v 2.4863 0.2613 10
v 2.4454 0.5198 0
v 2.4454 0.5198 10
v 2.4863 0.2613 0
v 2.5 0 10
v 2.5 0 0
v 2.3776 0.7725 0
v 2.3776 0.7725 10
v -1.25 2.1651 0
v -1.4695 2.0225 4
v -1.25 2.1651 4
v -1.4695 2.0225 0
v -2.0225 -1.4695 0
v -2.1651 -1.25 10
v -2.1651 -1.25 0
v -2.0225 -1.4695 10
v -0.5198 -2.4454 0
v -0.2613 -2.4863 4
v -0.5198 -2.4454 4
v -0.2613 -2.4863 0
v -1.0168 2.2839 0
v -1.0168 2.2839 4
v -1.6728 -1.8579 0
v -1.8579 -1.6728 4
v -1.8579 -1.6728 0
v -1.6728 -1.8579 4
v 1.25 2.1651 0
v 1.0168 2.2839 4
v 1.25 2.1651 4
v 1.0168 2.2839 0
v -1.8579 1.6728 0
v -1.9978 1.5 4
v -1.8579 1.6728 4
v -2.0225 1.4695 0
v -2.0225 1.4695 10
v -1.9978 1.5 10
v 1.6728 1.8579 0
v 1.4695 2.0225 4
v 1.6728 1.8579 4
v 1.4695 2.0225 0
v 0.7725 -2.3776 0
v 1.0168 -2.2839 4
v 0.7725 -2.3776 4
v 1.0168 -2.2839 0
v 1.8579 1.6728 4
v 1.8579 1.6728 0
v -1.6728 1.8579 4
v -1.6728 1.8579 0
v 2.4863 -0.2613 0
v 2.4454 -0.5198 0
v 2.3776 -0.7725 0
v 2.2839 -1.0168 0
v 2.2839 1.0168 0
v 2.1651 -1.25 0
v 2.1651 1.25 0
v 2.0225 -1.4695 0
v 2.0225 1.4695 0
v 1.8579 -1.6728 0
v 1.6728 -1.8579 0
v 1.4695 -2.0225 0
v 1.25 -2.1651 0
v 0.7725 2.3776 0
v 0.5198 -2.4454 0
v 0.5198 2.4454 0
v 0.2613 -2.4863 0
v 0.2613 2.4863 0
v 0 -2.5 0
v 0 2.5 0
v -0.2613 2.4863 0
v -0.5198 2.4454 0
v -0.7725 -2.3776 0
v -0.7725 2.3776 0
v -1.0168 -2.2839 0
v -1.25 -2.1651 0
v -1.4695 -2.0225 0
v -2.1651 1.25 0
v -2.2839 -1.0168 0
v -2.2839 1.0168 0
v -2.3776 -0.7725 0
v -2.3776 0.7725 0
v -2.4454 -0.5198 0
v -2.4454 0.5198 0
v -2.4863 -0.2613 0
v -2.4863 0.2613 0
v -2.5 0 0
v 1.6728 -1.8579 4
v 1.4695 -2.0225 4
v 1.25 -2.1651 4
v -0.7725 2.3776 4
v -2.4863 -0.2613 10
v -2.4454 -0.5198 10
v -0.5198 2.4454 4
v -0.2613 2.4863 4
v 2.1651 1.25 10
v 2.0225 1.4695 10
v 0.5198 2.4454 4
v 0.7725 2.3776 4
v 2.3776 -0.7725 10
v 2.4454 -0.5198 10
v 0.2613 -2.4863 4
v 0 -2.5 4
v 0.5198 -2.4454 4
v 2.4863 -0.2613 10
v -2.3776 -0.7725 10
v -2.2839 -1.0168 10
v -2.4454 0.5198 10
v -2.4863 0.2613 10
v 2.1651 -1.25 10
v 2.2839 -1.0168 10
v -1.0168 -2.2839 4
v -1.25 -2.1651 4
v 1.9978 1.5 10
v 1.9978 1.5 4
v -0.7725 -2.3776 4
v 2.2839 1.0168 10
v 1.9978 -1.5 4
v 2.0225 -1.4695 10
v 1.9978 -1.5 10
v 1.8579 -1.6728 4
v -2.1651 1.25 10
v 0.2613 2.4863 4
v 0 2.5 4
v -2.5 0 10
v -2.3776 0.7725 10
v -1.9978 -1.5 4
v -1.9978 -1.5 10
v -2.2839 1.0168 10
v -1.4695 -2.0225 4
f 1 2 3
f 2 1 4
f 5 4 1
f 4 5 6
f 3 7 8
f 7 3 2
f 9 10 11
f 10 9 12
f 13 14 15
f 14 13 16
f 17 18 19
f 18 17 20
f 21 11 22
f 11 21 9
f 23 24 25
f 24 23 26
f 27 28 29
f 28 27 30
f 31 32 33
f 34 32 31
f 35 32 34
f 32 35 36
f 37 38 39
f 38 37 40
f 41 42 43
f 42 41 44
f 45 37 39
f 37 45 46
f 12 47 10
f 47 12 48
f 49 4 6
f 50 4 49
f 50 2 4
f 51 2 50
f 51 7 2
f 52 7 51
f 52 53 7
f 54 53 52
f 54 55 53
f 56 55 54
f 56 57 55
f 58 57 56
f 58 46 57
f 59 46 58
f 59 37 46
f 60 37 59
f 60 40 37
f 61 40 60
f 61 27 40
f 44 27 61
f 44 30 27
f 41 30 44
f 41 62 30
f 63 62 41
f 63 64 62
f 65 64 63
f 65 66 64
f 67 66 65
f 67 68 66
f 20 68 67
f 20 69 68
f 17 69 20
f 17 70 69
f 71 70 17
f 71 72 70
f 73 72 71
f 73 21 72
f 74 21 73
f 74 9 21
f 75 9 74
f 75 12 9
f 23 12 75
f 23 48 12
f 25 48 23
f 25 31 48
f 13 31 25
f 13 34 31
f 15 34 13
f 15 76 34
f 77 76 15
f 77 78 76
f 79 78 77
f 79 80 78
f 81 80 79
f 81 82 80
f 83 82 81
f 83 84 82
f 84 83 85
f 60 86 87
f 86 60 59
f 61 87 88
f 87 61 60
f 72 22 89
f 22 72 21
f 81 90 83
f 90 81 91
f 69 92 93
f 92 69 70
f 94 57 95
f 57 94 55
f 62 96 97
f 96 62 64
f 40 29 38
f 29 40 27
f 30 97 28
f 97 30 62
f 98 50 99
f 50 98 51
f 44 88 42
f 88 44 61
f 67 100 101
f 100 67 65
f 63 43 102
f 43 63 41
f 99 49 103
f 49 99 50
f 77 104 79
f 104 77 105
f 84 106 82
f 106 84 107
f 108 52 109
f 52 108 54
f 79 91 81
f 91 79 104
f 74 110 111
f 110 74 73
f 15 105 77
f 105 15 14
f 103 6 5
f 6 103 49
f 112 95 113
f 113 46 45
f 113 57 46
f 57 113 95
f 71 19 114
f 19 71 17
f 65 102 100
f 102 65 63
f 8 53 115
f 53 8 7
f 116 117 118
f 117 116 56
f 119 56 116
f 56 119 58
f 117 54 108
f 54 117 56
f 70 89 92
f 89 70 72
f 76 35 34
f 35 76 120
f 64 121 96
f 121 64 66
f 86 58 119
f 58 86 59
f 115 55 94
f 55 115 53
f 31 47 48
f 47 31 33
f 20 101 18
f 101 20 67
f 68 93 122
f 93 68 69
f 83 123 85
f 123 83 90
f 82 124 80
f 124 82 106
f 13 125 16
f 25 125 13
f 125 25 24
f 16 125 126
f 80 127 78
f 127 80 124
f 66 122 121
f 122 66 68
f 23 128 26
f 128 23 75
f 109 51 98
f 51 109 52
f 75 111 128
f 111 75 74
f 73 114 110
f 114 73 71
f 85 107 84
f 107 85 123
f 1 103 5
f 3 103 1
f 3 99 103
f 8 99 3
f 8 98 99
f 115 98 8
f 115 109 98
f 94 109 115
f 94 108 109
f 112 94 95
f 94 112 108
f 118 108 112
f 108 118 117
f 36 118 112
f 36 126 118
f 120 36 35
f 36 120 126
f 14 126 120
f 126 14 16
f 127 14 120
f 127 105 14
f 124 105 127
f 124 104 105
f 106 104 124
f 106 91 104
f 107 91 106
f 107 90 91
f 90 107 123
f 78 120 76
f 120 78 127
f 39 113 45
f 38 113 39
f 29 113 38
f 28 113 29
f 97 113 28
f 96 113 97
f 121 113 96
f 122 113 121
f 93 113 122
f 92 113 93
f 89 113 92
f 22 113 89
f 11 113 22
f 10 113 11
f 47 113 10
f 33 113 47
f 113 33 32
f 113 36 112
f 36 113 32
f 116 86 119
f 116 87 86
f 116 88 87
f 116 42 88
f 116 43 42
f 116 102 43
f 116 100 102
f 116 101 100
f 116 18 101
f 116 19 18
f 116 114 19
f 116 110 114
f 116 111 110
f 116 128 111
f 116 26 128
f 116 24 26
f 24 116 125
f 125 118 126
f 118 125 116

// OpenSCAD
/*
   Copyright 2015-2018 Scott Bezek and the splitflap contributors

   Licensed under the Apache License, Version 2.0 (the "License");
   you may not use this file except in compliance with the License.
   You may obtain a copy of the License at

       http://www.apache.org/licenses/LICENSE-2.0

   Unless required by applicable law or agreed to in writing, software
   distributed under the License is distributed on an "AS IS" BASIS,
   WITHOUT WARRANTIES OR CONDITIONS OF ANY KIND, either express or implied.
   See the License for the specific language governing permissions and
   limitations under the License.
*/

28byj48_chassis_radius = 28/2;
28byj48_chassis_height = 19;
28byj48_shaft_offset = 8;
28byj48_mount_outer_radius = 3.5;
28byj48_mount_hole_radius = 4.2/2;
28byj48_mount_center_offset = 35/2;
28byj48_mount_bracket_height = 0.8;

28byj48_shaft_collar_radius = 9/2;
28byj48_shaft_collar_height = 1.5;

28byj48_shaft_radius = 5/2;
28byj48_shaft_height = 10;
28byj48_shaft_slotted_width = 3;
28byj48_shaft_slotted_height = 6;

28byj48_backpack_width = 14.6;
28byj48_backpack_extent = 18; // seen values from 17-18
28byj48_backpack_height = 16;

// Exports for use in other files:
function 28byj48_mount_bracket_height() = 28byj48_mount_bracket_height;
function 28byj48_shaft_radius() = 28byj48_shaft_radius;
function 28byj48_mount_center_offset() = 28byj48_mount_center_offset;
function 28byj48_chassis_radius() = 28byj48_chassis_radius;
function 28byj48_shaft_offset() = 28byj48_shaft_offset;
function 28byj48_chassis_height() = 28byj48_chassis_height;
function 28byj48_backpack_extent() = 28byj48_backpack_extent;

// Basic 28BYJ-48 model based on various dimensioned drawings.
// Origin is centered on the shaft, on the front face of the motor, with the shaft in the +z direction
module Stepper28BYJ48() {
    $fn = 60;

    eps = 0.01;

    gray = [0.7, 0.7, 0.7];
    gold = [1, 0.843, 0];
    blue = [0, 0, 1];

    module mounting_holes() {
        linear_extrude(height=28byj48_mount_bracket_height) {
        difference() {
            hull() {
                translate([28byj48_mount_center_offset, 0]) {
                    circle(r=28byj48_mount_outer_radius);
                }
                translate([-28byj48_mount_center_offset, 0]) {
                    circle(r=28byj48_mount_outer_radius);
                }
            }

            translate([28byj48_mount_center_offset, 0]) {
                circle(r=28byj48_mount_hole_radius);
            }
            translate([-28byj48_mount_center_offset, 0]) {
                circle(r=28byj48_mount_hole_radius);
            }
        }
        }
    }

    module shaft_collar() {
        cylinder(r=28byj48_shaft_collar_radius, h=28byj48_shaft_collar_height + eps);
    }

    module shaft() {
         color_selector(gold) {
            difference() {
                cylinder(r=28byj48_shaft_radius, h=28byj48_shaft_height);
                translate([-(28byj48_shaft_radius + eps), 28byj48_shaft_slotted_width / 2, 28byj48_shaft_height - 28byj48_shaft_slotted_height]) {
                    cube([(28byj48_shaft_radius+eps)*2, 28byj48_shaft_radius, 28byj48_shaft_slotted_height+eps]);
                }
                translate([-(28byj48_shaft_radius + eps), - 28byj48_shaft_radius - (28byj48_shaft_slotted_width / 2), 28byj48_shaft_height - 28byj48_shaft_slotted_height]) {
                    cube([(28byj48_shaft_radius+eps)*2, 28byj48_shaft_radius, 28byj48_shaft_slotted_height+eps]);
                }
            }
        }
    }

    module chassis() {
         color_selector(gray) {
            translate([0, 0, -28byj48_chassis_height]) {
                cylinder(r=28byj48_chassis_radius, h=28byj48_chassis_height);
            }
            translate([0, 0, -28byj48_mount_bracket_height - eps]) {
                mounting_holes();
            }
            translate([0, 28byj48_shaft_offset, -eps]) {
                shaft_collar();
            }
        }
    }

    module backpack() {
         color_selector(blue) {
            translate([-28byj48_backpack_width/2, 0, -28byj48_backpack_height - eps]) {
                cube([28byj48_backpack_width, 28byj48_backpack_extent, 28byj48_backpack_height]);
            }
        }
    }

    translate([0, -28byj48_shaft_offset, 0]) {
        chassis();
        translate([0, 28byj48_shaft_offset, 0]) {
            shaft();
        }
        translate([0, -28byj48_backpack_extent, 0]) {
            backpack();
        }
    }
}

// Example usage:
Stepper28BYJ48();

        module color_selector(c) {
            precision = 0.0000001;  // arbitrary
            function compare_floats(x, y, i=0) = 
                  (len(x) != len(y)) ? false  // if arrays differ in length, they can't be equal
                : (i >= len(x)) ? true  // if we've hit the end of the arrays without issue, we're equal
                : (x[i] - precision <= y[i]) && x[i] + precision >= y[i]
                    ? compare_floats(x, y, i+1)
                    : false;  // not equal, short circuit

            if (c == [1, 0.843, 0] || compare_floats(c, [1, 0.843, 0]))
                children();
        }
                    
